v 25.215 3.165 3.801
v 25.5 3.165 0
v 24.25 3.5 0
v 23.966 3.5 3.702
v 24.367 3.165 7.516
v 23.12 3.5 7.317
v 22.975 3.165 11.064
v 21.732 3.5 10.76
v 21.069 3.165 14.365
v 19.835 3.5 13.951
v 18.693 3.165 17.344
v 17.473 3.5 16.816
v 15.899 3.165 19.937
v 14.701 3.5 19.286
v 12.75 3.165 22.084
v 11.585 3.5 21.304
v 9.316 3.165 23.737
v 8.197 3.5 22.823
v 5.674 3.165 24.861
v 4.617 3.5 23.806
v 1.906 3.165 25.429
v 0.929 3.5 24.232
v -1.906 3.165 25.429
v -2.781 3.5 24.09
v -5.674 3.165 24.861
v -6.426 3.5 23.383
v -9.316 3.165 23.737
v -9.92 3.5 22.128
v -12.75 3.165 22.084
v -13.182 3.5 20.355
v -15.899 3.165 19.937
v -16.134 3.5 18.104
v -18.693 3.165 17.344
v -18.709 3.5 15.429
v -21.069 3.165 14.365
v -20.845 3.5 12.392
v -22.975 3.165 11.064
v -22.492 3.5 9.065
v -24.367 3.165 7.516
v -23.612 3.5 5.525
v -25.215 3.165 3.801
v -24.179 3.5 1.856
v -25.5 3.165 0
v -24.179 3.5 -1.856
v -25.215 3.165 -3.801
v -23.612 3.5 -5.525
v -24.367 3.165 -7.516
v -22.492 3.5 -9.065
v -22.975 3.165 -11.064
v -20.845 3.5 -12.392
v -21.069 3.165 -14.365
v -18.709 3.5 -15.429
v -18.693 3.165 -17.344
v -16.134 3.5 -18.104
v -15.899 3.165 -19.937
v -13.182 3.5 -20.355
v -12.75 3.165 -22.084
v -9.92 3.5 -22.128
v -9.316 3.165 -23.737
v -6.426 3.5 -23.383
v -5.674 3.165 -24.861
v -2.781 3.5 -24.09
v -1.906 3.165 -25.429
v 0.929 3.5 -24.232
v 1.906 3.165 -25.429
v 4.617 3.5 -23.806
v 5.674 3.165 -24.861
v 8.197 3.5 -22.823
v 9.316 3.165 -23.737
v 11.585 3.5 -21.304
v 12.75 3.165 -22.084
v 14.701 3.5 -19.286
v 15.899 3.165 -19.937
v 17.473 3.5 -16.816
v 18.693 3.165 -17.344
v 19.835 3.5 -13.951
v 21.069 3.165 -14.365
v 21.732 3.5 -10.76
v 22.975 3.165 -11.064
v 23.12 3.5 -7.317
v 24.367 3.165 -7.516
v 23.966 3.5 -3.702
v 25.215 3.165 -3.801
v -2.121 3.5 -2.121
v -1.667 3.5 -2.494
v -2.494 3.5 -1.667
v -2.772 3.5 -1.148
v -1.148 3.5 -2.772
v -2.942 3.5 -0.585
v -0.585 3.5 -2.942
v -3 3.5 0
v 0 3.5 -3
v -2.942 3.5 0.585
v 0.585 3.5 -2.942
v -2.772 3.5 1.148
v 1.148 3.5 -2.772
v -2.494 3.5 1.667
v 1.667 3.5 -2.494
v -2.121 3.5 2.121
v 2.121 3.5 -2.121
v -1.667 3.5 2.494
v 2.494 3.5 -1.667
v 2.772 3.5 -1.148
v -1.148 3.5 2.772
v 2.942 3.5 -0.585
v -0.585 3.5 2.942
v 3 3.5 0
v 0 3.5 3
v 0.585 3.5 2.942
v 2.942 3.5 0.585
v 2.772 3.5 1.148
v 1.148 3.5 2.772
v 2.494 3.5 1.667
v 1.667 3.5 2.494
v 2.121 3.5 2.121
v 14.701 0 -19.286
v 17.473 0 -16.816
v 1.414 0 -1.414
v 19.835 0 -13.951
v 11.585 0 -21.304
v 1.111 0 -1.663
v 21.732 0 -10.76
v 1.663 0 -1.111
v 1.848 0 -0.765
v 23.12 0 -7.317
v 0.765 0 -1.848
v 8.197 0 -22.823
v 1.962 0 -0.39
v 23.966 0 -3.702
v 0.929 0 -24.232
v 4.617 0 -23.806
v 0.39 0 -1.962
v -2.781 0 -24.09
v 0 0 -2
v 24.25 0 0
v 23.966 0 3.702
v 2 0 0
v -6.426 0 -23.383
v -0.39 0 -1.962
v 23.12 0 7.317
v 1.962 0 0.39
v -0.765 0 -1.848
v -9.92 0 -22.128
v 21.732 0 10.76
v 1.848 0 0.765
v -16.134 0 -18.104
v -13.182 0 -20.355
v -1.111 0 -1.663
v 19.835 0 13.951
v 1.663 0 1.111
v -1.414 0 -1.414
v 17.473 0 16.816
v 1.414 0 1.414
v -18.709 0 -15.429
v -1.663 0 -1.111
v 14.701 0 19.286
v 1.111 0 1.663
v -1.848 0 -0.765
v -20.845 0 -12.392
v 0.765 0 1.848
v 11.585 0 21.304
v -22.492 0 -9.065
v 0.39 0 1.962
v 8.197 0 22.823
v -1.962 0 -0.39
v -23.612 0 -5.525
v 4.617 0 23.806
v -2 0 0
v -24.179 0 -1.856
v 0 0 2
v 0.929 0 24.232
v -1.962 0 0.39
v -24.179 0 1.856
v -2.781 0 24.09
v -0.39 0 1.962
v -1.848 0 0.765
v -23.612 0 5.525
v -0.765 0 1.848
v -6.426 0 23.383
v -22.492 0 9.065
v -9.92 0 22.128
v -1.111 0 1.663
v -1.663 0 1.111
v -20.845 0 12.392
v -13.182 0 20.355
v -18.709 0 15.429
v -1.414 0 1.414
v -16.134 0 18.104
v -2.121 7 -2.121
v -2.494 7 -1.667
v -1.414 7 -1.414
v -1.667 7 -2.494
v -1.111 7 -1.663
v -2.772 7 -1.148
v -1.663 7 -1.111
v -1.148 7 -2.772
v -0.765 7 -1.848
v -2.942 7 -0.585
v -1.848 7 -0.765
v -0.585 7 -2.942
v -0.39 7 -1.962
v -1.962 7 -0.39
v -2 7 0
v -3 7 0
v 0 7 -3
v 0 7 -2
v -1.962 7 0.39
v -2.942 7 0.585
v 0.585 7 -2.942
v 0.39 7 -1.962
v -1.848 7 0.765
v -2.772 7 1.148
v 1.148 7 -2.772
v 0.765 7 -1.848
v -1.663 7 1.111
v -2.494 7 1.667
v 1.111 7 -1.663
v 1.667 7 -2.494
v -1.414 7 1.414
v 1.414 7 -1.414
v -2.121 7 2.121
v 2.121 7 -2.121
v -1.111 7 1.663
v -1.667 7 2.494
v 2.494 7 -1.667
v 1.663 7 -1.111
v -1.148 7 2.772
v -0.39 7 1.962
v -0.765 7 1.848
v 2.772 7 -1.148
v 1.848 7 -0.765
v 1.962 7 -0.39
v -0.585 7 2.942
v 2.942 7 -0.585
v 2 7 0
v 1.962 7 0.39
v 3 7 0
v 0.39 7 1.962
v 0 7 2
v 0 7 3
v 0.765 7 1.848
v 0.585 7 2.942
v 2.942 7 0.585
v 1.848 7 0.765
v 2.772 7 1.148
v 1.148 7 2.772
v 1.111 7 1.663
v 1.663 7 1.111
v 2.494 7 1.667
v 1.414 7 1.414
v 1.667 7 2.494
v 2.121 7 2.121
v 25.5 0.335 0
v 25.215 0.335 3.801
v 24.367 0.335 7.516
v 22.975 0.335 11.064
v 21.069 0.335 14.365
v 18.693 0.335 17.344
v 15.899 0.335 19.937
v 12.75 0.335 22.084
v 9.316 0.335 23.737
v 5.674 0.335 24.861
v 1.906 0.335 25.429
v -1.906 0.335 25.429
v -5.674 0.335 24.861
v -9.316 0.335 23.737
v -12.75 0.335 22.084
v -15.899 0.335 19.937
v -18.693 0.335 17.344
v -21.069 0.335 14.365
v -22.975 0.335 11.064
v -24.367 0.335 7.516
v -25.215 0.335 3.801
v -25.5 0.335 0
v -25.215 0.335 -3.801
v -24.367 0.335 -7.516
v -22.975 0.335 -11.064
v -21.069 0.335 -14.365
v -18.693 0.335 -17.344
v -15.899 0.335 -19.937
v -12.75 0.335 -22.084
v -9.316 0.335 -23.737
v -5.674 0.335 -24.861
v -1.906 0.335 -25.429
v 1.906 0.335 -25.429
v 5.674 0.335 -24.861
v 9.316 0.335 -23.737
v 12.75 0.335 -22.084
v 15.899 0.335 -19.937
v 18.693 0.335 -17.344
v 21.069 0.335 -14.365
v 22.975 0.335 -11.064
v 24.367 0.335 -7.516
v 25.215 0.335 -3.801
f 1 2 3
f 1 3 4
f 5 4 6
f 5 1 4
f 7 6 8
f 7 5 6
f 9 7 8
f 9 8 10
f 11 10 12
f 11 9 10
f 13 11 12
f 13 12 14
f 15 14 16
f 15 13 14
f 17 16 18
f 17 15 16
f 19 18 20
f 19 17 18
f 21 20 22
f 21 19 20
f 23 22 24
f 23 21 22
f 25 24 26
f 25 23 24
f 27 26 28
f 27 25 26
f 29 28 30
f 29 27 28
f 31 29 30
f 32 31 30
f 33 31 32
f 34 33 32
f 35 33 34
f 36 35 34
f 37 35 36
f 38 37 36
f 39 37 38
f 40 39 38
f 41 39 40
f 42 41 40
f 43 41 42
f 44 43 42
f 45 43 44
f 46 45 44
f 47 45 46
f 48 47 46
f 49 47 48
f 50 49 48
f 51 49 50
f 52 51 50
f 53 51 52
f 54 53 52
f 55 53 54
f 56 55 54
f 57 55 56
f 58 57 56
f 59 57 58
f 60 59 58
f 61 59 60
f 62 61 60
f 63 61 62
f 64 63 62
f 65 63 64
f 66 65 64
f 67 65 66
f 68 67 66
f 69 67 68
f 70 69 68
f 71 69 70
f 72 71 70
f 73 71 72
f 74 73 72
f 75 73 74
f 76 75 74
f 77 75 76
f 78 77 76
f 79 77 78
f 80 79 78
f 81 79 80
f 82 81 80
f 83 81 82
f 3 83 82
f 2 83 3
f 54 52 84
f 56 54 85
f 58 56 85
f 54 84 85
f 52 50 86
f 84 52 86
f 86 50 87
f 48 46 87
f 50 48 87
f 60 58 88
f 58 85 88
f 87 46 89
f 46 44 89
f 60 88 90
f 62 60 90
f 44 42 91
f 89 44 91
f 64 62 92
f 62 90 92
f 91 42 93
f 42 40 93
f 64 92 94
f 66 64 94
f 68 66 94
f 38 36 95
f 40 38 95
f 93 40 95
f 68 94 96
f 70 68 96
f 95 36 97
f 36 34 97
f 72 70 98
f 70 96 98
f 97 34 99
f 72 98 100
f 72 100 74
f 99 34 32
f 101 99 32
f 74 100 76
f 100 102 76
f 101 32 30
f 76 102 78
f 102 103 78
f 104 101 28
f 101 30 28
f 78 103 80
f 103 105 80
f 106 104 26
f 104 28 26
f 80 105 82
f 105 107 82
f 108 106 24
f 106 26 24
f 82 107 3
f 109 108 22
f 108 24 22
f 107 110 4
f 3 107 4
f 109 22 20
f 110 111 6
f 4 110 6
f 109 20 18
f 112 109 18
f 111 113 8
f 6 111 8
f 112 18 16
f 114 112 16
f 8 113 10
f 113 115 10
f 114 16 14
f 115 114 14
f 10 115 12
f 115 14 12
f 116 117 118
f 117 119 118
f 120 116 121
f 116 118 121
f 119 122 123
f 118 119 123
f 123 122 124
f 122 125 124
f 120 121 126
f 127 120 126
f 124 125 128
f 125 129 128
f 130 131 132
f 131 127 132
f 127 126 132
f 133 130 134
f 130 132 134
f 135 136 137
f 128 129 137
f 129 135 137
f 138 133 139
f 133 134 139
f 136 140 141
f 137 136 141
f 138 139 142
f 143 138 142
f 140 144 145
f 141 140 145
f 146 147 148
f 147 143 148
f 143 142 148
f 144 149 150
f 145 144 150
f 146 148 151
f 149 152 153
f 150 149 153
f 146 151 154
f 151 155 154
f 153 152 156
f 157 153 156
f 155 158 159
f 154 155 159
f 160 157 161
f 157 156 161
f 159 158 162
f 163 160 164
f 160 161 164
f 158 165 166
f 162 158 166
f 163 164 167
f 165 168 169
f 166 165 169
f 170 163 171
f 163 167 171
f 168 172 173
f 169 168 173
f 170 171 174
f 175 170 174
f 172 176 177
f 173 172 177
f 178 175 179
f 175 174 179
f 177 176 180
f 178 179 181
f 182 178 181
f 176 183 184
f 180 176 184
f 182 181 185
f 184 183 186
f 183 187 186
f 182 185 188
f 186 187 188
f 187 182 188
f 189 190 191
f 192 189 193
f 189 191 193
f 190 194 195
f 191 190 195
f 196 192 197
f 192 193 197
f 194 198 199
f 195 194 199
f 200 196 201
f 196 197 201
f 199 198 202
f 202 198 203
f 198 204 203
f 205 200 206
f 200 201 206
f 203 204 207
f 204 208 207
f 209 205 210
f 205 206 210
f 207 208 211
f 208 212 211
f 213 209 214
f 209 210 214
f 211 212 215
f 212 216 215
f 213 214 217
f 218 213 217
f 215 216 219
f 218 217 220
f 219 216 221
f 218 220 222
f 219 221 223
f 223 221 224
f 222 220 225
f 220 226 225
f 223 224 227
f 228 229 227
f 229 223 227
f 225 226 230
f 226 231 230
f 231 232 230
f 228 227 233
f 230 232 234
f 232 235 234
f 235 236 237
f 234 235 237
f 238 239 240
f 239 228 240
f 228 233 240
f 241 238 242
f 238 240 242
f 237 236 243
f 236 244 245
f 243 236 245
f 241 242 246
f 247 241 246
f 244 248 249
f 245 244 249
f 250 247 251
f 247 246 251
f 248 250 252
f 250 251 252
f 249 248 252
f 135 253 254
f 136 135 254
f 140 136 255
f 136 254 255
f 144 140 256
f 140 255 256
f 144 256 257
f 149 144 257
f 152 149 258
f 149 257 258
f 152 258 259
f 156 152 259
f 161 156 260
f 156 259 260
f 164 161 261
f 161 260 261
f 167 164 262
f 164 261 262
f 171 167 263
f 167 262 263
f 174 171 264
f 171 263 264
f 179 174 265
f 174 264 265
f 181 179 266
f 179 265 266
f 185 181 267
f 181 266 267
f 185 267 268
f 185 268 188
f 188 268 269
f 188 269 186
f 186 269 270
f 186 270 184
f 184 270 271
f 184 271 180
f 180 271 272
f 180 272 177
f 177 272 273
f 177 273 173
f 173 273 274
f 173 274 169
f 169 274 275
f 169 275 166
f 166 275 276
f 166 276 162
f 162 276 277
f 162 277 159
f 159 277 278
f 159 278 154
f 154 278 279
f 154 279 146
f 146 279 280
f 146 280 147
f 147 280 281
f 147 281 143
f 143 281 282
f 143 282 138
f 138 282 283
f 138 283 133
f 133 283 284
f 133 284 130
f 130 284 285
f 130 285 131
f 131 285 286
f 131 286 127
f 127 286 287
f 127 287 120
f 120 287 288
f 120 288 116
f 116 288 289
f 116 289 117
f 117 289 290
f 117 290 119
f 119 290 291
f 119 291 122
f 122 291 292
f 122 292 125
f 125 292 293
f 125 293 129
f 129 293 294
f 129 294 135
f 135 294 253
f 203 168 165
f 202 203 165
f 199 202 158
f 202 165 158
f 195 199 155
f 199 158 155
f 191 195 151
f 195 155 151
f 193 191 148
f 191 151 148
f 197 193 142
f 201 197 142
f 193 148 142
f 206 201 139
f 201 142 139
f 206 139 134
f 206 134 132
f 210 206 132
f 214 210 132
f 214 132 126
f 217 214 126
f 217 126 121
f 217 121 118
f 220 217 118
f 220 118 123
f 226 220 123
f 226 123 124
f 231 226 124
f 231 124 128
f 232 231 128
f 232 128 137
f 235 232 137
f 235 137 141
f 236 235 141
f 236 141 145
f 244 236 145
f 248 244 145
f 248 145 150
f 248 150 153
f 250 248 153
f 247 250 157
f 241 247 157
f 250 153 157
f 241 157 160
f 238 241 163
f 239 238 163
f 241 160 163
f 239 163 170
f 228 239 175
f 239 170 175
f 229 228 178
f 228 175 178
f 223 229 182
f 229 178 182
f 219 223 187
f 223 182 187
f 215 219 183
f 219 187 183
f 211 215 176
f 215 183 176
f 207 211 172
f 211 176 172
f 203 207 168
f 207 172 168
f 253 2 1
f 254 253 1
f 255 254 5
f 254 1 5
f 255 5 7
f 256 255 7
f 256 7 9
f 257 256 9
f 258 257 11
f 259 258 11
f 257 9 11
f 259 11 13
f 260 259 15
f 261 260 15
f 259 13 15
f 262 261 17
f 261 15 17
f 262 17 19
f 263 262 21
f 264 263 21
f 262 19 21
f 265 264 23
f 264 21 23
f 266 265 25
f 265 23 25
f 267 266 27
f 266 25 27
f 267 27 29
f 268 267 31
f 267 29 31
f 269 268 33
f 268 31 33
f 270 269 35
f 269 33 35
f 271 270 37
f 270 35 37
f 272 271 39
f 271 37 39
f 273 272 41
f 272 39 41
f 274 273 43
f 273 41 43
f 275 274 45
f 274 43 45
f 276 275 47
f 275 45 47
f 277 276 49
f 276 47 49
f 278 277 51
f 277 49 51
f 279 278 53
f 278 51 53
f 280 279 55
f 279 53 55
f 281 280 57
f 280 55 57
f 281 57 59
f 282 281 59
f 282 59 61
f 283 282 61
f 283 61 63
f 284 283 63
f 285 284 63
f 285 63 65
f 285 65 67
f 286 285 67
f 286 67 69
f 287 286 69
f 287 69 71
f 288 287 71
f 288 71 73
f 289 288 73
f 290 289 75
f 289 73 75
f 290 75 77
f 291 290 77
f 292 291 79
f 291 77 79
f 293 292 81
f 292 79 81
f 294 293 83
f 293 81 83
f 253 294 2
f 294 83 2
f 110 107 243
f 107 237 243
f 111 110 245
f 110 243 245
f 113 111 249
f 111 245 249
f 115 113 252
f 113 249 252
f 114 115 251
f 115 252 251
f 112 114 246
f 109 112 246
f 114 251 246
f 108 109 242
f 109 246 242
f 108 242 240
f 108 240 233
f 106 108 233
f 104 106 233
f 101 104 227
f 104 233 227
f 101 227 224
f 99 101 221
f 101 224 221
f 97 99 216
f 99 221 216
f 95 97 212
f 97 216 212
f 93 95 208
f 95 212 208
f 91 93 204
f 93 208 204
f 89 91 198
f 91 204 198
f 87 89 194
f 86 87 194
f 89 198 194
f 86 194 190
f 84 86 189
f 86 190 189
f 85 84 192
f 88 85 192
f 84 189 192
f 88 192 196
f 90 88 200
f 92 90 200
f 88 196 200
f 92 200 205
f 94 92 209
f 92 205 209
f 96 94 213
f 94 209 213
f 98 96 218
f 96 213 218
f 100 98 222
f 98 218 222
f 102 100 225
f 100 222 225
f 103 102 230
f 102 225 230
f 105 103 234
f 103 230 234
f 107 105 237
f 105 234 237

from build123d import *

# Parameters (mm, degrees)
CHAMFER_1_SIZE           = 1.25
CHAMFER_1_SIZE2          = 0.334936491
SKETCH_2_R               = 2
CUT_EXTRUDE_3_DEPTH      = 1
CUT_EXTRUDE_3_DEPTH_BACK = 8
CHAMFER_2_SIZE           = 1.25
CHAMFER_2_SIZE2          = 0.334936491


with BuildPart() as part:
    # Эскиз1 → Повернуть2 (revolve)
    with BuildSketch(Plane.XY):
        Polygon((0, 0), (25.5, 0), (25.5, 3.5), (3, 3.5), (3, 7), (0, 7), align=None)
    revolve(axis=Axis((0, 7, 0), (0, -1, 0)))

    # Фаска1
    chamfer_1_edges = [part.edges().sort_by_distance(p)[0] for p in [
        (-25.5, 3.5, 0),
    ]]
    chamfer_1_side = [part.faces().sort_by_distance(p)[0] for p in [
        (-24.778751083, 3.5, 0),
    ]]
    chamfer(chamfer_1_edges, length=CHAMFER_1_SIZE, length2=CHAMFER_1_SIZE2, reference=chamfer_1_side[0])

    # Эскиз2 → Вырез-Вытянуть3 (cut, two sides)
    with BuildSketch(Plane(origin=(0, 0, 0), x_dir=(-1, 0, 0), z_dir=(0, -1, 0))) as cut_extrude_3_sk:
        Circle(SKETCH_2_R)
    extrude(amount=CUT_EXTRUDE_3_DEPTH, mode=Mode.SUBTRACT)
    extrude(cut_extrude_3_sk.sketch, amount=-CUT_EXTRUDE_3_DEPTH_BACK, mode=Mode.SUBTRACT)

    # Фаска2
    chamfer_2_edges = [part.edges().sort_by_distance(p)[0] for p in [
        (-25.5, 0, 0),
    ]]
    chamfer_2_side = [part.faces().sort_by_distance(p)[0] for p in [
        (-24.778751083, 0, 0),
    ]]
    chamfer(chamfer_2_edges, length=CHAMFER_2_SIZE, length2=CHAMFER_2_SIZE2, reference=chamfer_2_side[0])


solid = part.part
